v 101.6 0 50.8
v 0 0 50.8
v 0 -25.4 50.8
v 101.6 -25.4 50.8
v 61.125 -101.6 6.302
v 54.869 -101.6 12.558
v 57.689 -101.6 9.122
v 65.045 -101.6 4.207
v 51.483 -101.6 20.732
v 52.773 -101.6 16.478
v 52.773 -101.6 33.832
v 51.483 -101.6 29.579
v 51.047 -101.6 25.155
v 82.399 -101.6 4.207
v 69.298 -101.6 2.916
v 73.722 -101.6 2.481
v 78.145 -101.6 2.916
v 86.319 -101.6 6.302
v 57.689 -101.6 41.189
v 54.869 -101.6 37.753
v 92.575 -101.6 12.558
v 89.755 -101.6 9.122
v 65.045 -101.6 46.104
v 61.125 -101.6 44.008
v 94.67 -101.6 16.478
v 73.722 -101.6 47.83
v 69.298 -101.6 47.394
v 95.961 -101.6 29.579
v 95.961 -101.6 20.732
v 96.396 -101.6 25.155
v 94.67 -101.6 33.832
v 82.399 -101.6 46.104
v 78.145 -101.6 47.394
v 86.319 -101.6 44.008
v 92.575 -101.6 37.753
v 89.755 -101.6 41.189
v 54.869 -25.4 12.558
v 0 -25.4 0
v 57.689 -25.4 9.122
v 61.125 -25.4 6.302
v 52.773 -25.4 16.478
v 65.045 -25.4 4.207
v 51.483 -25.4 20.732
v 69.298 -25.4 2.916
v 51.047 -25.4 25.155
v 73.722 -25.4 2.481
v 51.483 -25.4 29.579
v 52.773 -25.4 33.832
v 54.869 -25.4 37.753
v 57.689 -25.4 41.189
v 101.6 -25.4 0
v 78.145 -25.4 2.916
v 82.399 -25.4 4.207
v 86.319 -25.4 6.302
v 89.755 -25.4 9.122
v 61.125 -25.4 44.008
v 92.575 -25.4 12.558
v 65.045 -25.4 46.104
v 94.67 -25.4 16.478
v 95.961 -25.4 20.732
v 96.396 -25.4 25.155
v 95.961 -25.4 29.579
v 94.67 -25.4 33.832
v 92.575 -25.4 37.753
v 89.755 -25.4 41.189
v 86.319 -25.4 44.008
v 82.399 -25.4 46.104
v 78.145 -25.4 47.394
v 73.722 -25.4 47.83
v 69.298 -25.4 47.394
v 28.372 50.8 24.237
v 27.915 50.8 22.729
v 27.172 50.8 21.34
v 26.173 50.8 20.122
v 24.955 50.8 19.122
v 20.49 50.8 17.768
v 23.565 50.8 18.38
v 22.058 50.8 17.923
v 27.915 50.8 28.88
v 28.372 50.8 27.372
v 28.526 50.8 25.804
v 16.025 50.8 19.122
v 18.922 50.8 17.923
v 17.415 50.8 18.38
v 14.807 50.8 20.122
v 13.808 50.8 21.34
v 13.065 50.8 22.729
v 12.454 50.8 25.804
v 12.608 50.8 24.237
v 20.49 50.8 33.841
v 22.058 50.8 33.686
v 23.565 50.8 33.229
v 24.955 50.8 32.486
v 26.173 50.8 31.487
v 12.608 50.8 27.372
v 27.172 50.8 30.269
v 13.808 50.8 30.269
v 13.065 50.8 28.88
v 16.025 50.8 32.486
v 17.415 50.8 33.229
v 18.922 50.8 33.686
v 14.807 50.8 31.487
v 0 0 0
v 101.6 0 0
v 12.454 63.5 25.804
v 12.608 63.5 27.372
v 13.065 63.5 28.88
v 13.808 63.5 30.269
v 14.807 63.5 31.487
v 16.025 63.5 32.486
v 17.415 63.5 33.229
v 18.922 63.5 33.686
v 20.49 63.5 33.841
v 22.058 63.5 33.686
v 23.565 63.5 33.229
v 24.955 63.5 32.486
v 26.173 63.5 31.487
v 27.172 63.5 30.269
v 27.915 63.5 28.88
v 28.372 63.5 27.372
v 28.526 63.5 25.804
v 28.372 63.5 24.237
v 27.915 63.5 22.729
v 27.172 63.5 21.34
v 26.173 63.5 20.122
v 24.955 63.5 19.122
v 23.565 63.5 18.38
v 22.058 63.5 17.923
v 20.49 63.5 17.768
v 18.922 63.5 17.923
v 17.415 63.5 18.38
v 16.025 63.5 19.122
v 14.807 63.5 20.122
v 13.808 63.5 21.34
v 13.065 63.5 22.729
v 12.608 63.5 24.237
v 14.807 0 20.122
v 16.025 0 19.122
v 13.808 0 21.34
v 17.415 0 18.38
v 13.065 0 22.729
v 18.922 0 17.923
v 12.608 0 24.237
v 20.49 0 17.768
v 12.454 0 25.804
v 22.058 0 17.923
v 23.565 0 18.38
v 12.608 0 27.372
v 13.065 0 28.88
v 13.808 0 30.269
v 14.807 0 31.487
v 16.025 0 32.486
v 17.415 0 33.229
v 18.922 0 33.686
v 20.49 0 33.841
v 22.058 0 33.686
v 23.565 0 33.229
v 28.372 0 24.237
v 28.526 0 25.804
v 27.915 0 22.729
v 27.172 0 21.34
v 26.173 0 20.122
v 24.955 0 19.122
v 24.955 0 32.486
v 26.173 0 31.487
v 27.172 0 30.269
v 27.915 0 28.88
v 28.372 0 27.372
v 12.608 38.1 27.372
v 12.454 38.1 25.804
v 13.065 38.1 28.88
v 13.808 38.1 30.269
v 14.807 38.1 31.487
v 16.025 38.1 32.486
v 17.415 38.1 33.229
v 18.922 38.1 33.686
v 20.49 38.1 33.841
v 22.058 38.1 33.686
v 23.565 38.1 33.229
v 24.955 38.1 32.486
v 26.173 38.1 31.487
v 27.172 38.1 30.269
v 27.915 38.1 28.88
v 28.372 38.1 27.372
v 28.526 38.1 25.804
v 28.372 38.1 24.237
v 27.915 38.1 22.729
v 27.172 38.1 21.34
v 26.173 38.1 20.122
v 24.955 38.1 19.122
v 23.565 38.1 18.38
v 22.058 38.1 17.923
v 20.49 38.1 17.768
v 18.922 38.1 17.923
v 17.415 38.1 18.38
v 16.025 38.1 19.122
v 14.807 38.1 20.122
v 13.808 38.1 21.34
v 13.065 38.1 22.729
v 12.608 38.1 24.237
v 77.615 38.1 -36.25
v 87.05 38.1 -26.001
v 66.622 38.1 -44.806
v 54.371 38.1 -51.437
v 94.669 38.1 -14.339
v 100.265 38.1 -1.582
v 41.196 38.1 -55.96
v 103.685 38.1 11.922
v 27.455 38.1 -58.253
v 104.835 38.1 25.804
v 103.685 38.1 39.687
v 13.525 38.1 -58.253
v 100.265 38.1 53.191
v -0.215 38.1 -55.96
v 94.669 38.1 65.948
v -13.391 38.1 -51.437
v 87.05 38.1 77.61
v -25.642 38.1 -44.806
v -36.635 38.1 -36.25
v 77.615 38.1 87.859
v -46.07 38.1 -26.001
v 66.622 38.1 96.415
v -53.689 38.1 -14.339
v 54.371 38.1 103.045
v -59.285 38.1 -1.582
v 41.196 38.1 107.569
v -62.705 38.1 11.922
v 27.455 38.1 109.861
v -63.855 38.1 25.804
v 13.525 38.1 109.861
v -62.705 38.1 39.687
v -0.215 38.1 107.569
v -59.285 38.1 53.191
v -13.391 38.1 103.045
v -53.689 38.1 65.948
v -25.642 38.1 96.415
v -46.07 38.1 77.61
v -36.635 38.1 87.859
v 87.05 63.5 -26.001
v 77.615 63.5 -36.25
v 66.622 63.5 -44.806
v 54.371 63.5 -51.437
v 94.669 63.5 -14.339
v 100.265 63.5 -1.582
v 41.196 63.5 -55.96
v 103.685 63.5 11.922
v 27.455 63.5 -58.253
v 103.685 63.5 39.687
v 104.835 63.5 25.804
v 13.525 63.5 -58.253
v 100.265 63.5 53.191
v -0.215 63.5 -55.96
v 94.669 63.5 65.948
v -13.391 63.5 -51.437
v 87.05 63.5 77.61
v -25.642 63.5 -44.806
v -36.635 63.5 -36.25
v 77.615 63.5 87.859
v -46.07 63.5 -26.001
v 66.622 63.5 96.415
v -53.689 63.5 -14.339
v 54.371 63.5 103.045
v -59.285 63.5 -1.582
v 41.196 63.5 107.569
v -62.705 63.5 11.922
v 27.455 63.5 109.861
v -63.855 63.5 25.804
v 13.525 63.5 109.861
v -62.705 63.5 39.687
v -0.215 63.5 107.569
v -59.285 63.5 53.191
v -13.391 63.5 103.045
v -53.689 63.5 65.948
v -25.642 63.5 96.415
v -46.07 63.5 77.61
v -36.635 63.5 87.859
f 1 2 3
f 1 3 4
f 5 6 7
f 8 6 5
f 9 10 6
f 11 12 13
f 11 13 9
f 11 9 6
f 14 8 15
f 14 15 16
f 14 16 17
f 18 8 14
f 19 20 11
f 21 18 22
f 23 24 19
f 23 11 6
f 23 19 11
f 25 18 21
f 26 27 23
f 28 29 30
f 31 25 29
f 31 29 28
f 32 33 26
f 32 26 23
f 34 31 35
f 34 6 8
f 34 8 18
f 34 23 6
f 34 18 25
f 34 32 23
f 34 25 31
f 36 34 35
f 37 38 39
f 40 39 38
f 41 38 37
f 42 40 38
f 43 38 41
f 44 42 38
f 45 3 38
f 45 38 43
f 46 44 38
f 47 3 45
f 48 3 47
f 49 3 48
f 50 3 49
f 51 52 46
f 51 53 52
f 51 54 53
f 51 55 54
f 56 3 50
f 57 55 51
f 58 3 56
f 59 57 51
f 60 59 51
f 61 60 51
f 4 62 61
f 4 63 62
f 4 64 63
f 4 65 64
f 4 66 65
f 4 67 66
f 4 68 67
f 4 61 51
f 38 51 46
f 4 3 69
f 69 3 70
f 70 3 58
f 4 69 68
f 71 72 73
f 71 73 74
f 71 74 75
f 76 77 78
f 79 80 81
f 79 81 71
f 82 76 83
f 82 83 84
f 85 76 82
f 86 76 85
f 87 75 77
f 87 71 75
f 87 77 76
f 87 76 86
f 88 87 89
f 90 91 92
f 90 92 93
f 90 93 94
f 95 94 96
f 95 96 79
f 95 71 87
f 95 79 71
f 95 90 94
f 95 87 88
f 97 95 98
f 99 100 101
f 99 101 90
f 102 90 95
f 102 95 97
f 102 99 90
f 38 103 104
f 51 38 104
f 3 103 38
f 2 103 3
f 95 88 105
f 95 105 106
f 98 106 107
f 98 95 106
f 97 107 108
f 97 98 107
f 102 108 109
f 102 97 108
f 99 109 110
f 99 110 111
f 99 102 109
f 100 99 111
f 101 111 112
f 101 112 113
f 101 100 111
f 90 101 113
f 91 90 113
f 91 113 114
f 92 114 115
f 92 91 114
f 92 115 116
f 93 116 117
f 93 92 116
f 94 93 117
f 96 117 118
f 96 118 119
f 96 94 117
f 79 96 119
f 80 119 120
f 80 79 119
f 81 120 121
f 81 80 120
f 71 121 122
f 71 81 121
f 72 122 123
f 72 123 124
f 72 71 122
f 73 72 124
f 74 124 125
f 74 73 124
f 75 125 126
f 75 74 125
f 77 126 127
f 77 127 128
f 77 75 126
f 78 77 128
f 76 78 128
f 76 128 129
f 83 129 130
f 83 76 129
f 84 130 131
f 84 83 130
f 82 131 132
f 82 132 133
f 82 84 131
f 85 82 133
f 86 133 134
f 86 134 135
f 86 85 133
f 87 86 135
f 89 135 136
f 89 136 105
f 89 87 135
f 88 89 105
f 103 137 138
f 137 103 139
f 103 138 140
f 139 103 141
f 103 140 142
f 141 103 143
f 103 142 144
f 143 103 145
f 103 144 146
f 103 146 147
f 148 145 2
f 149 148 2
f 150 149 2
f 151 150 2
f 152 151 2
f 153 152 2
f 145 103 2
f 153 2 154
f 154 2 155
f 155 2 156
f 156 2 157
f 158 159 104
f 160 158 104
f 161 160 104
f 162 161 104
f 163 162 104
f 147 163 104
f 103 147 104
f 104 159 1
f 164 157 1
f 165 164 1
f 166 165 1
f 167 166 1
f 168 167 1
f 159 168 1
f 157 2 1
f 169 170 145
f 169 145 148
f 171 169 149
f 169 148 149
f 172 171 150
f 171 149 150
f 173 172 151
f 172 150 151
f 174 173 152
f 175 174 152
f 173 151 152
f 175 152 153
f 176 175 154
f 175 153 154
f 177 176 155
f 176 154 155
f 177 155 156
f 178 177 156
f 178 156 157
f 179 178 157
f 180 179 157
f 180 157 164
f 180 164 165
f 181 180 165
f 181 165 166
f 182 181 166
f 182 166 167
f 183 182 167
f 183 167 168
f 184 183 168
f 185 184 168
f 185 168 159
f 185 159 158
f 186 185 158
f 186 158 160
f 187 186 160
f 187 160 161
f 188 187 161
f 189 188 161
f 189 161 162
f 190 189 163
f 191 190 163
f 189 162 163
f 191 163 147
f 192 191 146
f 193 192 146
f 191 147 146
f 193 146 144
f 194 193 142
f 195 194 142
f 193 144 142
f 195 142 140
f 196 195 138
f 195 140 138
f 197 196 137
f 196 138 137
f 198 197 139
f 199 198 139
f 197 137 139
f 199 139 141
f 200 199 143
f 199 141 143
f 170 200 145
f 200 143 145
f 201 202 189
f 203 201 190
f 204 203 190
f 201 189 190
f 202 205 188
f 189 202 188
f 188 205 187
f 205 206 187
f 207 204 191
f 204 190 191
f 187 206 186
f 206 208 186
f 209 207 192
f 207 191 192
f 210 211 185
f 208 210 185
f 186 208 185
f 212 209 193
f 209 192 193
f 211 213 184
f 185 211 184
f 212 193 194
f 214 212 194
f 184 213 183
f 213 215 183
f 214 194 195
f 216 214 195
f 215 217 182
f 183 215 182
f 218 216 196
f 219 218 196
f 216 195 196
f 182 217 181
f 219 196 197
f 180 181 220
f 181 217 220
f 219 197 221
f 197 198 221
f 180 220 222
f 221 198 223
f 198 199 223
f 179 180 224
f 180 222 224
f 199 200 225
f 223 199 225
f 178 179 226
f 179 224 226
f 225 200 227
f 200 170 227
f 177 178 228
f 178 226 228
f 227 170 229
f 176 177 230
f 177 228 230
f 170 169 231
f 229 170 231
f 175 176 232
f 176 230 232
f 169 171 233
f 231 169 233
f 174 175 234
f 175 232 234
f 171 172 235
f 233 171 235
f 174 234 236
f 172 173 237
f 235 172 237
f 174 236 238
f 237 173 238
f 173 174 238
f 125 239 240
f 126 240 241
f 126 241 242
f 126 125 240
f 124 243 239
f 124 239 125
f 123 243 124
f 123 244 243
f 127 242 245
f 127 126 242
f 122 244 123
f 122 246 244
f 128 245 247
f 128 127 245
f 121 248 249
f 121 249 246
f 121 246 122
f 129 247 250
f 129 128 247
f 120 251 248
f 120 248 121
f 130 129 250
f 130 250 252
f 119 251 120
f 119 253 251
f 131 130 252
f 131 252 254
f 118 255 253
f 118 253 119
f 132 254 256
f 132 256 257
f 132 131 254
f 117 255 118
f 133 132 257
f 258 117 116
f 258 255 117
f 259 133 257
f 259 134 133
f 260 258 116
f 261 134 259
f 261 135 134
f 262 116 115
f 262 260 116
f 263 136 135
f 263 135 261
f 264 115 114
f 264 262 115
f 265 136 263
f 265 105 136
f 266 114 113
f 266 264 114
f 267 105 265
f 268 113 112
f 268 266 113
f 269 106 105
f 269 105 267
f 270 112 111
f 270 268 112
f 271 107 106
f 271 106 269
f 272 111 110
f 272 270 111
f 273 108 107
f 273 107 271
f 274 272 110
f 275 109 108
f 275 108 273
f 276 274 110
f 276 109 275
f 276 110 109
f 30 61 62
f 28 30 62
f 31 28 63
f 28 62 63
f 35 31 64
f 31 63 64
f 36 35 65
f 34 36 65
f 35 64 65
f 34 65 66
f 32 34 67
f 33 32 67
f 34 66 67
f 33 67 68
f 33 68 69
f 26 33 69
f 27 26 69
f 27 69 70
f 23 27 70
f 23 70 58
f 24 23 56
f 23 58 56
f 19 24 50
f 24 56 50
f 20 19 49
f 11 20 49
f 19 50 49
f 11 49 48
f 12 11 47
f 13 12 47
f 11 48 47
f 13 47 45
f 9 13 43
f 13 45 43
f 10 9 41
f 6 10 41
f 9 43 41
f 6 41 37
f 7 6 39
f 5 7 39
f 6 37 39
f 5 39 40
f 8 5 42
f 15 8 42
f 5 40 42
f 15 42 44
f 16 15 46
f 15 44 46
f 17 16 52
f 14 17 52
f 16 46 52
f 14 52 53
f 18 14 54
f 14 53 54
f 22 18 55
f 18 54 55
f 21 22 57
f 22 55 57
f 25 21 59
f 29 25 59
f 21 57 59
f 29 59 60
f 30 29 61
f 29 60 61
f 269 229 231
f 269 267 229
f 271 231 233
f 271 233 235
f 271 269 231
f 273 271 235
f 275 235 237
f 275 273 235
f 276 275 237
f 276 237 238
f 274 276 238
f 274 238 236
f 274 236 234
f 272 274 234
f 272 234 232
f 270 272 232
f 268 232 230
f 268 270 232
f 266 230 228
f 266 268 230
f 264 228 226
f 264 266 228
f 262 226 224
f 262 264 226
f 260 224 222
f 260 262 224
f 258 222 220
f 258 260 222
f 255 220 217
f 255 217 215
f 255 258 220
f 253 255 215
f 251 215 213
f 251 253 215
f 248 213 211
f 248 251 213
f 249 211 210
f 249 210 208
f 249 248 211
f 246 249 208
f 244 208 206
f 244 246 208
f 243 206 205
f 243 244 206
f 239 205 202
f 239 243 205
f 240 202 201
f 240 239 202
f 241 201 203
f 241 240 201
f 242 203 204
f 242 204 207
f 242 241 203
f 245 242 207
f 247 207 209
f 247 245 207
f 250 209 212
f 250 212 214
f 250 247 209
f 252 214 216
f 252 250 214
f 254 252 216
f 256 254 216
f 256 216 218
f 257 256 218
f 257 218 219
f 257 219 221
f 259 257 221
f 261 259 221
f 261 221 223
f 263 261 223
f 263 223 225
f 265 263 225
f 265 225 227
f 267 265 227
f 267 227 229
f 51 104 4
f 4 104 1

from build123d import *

# Parameters (mm, degrees)
F0_W     = 101.6
F0_H     = 50.8
F1_DEPTH = 25.4
F2_R     = 22.674477
F3_DEPTH = 76.2
F4_R     = 8.036326
F5_DEPTH = 50.8
F6_R     = 84.345052
F6_R_2   = 8.036326
F7_DEPTH = 12.7


with BuildPart() as f1:
    # F0 (on Front) → F1 (new body)
    with BuildSketch(Plane.XZ):
        with Locations((50.8, 25.4)):
            Rectangle(F0_W, F0_H)
    extrude(amount=F1_DEPTH)

    # F2 (on face) → F3 (join)
    with BuildSketch(Plane.XZ.offset(25.4)):
        with Locations((73.721826, 25.155274)):
            Circle(F2_R)
    extrude(amount=F3_DEPTH)

    # F4 (on face) → F5 (join)
    with BuildSketch(Plane(origin=(0, 0, 0), x_dir=(-1, 0, 0), z_dir=(0, 1, 0))):
        with Locations((-20.490019, 25.804443)):
            Circle(F4_R)
    extrude(amount=F5_DEPTH)

    # F6 (on face) → F7 (join, symmetric)
    with BuildSketch(Plane(origin=(0, 50.8, 0), x_dir=(-1, 0, 0), z_dir=(0, 1, 0))):
        with Locations((-20.490019, 25.804443)):
            Circle(F6_R)
        with Locations((-20.490019, 25.804443)):
            Circle(F6_R_2, mode=Mode.SUBTRACT)
    extrude(amount=F7_DEPTH, both=True)


solid = f1.part
